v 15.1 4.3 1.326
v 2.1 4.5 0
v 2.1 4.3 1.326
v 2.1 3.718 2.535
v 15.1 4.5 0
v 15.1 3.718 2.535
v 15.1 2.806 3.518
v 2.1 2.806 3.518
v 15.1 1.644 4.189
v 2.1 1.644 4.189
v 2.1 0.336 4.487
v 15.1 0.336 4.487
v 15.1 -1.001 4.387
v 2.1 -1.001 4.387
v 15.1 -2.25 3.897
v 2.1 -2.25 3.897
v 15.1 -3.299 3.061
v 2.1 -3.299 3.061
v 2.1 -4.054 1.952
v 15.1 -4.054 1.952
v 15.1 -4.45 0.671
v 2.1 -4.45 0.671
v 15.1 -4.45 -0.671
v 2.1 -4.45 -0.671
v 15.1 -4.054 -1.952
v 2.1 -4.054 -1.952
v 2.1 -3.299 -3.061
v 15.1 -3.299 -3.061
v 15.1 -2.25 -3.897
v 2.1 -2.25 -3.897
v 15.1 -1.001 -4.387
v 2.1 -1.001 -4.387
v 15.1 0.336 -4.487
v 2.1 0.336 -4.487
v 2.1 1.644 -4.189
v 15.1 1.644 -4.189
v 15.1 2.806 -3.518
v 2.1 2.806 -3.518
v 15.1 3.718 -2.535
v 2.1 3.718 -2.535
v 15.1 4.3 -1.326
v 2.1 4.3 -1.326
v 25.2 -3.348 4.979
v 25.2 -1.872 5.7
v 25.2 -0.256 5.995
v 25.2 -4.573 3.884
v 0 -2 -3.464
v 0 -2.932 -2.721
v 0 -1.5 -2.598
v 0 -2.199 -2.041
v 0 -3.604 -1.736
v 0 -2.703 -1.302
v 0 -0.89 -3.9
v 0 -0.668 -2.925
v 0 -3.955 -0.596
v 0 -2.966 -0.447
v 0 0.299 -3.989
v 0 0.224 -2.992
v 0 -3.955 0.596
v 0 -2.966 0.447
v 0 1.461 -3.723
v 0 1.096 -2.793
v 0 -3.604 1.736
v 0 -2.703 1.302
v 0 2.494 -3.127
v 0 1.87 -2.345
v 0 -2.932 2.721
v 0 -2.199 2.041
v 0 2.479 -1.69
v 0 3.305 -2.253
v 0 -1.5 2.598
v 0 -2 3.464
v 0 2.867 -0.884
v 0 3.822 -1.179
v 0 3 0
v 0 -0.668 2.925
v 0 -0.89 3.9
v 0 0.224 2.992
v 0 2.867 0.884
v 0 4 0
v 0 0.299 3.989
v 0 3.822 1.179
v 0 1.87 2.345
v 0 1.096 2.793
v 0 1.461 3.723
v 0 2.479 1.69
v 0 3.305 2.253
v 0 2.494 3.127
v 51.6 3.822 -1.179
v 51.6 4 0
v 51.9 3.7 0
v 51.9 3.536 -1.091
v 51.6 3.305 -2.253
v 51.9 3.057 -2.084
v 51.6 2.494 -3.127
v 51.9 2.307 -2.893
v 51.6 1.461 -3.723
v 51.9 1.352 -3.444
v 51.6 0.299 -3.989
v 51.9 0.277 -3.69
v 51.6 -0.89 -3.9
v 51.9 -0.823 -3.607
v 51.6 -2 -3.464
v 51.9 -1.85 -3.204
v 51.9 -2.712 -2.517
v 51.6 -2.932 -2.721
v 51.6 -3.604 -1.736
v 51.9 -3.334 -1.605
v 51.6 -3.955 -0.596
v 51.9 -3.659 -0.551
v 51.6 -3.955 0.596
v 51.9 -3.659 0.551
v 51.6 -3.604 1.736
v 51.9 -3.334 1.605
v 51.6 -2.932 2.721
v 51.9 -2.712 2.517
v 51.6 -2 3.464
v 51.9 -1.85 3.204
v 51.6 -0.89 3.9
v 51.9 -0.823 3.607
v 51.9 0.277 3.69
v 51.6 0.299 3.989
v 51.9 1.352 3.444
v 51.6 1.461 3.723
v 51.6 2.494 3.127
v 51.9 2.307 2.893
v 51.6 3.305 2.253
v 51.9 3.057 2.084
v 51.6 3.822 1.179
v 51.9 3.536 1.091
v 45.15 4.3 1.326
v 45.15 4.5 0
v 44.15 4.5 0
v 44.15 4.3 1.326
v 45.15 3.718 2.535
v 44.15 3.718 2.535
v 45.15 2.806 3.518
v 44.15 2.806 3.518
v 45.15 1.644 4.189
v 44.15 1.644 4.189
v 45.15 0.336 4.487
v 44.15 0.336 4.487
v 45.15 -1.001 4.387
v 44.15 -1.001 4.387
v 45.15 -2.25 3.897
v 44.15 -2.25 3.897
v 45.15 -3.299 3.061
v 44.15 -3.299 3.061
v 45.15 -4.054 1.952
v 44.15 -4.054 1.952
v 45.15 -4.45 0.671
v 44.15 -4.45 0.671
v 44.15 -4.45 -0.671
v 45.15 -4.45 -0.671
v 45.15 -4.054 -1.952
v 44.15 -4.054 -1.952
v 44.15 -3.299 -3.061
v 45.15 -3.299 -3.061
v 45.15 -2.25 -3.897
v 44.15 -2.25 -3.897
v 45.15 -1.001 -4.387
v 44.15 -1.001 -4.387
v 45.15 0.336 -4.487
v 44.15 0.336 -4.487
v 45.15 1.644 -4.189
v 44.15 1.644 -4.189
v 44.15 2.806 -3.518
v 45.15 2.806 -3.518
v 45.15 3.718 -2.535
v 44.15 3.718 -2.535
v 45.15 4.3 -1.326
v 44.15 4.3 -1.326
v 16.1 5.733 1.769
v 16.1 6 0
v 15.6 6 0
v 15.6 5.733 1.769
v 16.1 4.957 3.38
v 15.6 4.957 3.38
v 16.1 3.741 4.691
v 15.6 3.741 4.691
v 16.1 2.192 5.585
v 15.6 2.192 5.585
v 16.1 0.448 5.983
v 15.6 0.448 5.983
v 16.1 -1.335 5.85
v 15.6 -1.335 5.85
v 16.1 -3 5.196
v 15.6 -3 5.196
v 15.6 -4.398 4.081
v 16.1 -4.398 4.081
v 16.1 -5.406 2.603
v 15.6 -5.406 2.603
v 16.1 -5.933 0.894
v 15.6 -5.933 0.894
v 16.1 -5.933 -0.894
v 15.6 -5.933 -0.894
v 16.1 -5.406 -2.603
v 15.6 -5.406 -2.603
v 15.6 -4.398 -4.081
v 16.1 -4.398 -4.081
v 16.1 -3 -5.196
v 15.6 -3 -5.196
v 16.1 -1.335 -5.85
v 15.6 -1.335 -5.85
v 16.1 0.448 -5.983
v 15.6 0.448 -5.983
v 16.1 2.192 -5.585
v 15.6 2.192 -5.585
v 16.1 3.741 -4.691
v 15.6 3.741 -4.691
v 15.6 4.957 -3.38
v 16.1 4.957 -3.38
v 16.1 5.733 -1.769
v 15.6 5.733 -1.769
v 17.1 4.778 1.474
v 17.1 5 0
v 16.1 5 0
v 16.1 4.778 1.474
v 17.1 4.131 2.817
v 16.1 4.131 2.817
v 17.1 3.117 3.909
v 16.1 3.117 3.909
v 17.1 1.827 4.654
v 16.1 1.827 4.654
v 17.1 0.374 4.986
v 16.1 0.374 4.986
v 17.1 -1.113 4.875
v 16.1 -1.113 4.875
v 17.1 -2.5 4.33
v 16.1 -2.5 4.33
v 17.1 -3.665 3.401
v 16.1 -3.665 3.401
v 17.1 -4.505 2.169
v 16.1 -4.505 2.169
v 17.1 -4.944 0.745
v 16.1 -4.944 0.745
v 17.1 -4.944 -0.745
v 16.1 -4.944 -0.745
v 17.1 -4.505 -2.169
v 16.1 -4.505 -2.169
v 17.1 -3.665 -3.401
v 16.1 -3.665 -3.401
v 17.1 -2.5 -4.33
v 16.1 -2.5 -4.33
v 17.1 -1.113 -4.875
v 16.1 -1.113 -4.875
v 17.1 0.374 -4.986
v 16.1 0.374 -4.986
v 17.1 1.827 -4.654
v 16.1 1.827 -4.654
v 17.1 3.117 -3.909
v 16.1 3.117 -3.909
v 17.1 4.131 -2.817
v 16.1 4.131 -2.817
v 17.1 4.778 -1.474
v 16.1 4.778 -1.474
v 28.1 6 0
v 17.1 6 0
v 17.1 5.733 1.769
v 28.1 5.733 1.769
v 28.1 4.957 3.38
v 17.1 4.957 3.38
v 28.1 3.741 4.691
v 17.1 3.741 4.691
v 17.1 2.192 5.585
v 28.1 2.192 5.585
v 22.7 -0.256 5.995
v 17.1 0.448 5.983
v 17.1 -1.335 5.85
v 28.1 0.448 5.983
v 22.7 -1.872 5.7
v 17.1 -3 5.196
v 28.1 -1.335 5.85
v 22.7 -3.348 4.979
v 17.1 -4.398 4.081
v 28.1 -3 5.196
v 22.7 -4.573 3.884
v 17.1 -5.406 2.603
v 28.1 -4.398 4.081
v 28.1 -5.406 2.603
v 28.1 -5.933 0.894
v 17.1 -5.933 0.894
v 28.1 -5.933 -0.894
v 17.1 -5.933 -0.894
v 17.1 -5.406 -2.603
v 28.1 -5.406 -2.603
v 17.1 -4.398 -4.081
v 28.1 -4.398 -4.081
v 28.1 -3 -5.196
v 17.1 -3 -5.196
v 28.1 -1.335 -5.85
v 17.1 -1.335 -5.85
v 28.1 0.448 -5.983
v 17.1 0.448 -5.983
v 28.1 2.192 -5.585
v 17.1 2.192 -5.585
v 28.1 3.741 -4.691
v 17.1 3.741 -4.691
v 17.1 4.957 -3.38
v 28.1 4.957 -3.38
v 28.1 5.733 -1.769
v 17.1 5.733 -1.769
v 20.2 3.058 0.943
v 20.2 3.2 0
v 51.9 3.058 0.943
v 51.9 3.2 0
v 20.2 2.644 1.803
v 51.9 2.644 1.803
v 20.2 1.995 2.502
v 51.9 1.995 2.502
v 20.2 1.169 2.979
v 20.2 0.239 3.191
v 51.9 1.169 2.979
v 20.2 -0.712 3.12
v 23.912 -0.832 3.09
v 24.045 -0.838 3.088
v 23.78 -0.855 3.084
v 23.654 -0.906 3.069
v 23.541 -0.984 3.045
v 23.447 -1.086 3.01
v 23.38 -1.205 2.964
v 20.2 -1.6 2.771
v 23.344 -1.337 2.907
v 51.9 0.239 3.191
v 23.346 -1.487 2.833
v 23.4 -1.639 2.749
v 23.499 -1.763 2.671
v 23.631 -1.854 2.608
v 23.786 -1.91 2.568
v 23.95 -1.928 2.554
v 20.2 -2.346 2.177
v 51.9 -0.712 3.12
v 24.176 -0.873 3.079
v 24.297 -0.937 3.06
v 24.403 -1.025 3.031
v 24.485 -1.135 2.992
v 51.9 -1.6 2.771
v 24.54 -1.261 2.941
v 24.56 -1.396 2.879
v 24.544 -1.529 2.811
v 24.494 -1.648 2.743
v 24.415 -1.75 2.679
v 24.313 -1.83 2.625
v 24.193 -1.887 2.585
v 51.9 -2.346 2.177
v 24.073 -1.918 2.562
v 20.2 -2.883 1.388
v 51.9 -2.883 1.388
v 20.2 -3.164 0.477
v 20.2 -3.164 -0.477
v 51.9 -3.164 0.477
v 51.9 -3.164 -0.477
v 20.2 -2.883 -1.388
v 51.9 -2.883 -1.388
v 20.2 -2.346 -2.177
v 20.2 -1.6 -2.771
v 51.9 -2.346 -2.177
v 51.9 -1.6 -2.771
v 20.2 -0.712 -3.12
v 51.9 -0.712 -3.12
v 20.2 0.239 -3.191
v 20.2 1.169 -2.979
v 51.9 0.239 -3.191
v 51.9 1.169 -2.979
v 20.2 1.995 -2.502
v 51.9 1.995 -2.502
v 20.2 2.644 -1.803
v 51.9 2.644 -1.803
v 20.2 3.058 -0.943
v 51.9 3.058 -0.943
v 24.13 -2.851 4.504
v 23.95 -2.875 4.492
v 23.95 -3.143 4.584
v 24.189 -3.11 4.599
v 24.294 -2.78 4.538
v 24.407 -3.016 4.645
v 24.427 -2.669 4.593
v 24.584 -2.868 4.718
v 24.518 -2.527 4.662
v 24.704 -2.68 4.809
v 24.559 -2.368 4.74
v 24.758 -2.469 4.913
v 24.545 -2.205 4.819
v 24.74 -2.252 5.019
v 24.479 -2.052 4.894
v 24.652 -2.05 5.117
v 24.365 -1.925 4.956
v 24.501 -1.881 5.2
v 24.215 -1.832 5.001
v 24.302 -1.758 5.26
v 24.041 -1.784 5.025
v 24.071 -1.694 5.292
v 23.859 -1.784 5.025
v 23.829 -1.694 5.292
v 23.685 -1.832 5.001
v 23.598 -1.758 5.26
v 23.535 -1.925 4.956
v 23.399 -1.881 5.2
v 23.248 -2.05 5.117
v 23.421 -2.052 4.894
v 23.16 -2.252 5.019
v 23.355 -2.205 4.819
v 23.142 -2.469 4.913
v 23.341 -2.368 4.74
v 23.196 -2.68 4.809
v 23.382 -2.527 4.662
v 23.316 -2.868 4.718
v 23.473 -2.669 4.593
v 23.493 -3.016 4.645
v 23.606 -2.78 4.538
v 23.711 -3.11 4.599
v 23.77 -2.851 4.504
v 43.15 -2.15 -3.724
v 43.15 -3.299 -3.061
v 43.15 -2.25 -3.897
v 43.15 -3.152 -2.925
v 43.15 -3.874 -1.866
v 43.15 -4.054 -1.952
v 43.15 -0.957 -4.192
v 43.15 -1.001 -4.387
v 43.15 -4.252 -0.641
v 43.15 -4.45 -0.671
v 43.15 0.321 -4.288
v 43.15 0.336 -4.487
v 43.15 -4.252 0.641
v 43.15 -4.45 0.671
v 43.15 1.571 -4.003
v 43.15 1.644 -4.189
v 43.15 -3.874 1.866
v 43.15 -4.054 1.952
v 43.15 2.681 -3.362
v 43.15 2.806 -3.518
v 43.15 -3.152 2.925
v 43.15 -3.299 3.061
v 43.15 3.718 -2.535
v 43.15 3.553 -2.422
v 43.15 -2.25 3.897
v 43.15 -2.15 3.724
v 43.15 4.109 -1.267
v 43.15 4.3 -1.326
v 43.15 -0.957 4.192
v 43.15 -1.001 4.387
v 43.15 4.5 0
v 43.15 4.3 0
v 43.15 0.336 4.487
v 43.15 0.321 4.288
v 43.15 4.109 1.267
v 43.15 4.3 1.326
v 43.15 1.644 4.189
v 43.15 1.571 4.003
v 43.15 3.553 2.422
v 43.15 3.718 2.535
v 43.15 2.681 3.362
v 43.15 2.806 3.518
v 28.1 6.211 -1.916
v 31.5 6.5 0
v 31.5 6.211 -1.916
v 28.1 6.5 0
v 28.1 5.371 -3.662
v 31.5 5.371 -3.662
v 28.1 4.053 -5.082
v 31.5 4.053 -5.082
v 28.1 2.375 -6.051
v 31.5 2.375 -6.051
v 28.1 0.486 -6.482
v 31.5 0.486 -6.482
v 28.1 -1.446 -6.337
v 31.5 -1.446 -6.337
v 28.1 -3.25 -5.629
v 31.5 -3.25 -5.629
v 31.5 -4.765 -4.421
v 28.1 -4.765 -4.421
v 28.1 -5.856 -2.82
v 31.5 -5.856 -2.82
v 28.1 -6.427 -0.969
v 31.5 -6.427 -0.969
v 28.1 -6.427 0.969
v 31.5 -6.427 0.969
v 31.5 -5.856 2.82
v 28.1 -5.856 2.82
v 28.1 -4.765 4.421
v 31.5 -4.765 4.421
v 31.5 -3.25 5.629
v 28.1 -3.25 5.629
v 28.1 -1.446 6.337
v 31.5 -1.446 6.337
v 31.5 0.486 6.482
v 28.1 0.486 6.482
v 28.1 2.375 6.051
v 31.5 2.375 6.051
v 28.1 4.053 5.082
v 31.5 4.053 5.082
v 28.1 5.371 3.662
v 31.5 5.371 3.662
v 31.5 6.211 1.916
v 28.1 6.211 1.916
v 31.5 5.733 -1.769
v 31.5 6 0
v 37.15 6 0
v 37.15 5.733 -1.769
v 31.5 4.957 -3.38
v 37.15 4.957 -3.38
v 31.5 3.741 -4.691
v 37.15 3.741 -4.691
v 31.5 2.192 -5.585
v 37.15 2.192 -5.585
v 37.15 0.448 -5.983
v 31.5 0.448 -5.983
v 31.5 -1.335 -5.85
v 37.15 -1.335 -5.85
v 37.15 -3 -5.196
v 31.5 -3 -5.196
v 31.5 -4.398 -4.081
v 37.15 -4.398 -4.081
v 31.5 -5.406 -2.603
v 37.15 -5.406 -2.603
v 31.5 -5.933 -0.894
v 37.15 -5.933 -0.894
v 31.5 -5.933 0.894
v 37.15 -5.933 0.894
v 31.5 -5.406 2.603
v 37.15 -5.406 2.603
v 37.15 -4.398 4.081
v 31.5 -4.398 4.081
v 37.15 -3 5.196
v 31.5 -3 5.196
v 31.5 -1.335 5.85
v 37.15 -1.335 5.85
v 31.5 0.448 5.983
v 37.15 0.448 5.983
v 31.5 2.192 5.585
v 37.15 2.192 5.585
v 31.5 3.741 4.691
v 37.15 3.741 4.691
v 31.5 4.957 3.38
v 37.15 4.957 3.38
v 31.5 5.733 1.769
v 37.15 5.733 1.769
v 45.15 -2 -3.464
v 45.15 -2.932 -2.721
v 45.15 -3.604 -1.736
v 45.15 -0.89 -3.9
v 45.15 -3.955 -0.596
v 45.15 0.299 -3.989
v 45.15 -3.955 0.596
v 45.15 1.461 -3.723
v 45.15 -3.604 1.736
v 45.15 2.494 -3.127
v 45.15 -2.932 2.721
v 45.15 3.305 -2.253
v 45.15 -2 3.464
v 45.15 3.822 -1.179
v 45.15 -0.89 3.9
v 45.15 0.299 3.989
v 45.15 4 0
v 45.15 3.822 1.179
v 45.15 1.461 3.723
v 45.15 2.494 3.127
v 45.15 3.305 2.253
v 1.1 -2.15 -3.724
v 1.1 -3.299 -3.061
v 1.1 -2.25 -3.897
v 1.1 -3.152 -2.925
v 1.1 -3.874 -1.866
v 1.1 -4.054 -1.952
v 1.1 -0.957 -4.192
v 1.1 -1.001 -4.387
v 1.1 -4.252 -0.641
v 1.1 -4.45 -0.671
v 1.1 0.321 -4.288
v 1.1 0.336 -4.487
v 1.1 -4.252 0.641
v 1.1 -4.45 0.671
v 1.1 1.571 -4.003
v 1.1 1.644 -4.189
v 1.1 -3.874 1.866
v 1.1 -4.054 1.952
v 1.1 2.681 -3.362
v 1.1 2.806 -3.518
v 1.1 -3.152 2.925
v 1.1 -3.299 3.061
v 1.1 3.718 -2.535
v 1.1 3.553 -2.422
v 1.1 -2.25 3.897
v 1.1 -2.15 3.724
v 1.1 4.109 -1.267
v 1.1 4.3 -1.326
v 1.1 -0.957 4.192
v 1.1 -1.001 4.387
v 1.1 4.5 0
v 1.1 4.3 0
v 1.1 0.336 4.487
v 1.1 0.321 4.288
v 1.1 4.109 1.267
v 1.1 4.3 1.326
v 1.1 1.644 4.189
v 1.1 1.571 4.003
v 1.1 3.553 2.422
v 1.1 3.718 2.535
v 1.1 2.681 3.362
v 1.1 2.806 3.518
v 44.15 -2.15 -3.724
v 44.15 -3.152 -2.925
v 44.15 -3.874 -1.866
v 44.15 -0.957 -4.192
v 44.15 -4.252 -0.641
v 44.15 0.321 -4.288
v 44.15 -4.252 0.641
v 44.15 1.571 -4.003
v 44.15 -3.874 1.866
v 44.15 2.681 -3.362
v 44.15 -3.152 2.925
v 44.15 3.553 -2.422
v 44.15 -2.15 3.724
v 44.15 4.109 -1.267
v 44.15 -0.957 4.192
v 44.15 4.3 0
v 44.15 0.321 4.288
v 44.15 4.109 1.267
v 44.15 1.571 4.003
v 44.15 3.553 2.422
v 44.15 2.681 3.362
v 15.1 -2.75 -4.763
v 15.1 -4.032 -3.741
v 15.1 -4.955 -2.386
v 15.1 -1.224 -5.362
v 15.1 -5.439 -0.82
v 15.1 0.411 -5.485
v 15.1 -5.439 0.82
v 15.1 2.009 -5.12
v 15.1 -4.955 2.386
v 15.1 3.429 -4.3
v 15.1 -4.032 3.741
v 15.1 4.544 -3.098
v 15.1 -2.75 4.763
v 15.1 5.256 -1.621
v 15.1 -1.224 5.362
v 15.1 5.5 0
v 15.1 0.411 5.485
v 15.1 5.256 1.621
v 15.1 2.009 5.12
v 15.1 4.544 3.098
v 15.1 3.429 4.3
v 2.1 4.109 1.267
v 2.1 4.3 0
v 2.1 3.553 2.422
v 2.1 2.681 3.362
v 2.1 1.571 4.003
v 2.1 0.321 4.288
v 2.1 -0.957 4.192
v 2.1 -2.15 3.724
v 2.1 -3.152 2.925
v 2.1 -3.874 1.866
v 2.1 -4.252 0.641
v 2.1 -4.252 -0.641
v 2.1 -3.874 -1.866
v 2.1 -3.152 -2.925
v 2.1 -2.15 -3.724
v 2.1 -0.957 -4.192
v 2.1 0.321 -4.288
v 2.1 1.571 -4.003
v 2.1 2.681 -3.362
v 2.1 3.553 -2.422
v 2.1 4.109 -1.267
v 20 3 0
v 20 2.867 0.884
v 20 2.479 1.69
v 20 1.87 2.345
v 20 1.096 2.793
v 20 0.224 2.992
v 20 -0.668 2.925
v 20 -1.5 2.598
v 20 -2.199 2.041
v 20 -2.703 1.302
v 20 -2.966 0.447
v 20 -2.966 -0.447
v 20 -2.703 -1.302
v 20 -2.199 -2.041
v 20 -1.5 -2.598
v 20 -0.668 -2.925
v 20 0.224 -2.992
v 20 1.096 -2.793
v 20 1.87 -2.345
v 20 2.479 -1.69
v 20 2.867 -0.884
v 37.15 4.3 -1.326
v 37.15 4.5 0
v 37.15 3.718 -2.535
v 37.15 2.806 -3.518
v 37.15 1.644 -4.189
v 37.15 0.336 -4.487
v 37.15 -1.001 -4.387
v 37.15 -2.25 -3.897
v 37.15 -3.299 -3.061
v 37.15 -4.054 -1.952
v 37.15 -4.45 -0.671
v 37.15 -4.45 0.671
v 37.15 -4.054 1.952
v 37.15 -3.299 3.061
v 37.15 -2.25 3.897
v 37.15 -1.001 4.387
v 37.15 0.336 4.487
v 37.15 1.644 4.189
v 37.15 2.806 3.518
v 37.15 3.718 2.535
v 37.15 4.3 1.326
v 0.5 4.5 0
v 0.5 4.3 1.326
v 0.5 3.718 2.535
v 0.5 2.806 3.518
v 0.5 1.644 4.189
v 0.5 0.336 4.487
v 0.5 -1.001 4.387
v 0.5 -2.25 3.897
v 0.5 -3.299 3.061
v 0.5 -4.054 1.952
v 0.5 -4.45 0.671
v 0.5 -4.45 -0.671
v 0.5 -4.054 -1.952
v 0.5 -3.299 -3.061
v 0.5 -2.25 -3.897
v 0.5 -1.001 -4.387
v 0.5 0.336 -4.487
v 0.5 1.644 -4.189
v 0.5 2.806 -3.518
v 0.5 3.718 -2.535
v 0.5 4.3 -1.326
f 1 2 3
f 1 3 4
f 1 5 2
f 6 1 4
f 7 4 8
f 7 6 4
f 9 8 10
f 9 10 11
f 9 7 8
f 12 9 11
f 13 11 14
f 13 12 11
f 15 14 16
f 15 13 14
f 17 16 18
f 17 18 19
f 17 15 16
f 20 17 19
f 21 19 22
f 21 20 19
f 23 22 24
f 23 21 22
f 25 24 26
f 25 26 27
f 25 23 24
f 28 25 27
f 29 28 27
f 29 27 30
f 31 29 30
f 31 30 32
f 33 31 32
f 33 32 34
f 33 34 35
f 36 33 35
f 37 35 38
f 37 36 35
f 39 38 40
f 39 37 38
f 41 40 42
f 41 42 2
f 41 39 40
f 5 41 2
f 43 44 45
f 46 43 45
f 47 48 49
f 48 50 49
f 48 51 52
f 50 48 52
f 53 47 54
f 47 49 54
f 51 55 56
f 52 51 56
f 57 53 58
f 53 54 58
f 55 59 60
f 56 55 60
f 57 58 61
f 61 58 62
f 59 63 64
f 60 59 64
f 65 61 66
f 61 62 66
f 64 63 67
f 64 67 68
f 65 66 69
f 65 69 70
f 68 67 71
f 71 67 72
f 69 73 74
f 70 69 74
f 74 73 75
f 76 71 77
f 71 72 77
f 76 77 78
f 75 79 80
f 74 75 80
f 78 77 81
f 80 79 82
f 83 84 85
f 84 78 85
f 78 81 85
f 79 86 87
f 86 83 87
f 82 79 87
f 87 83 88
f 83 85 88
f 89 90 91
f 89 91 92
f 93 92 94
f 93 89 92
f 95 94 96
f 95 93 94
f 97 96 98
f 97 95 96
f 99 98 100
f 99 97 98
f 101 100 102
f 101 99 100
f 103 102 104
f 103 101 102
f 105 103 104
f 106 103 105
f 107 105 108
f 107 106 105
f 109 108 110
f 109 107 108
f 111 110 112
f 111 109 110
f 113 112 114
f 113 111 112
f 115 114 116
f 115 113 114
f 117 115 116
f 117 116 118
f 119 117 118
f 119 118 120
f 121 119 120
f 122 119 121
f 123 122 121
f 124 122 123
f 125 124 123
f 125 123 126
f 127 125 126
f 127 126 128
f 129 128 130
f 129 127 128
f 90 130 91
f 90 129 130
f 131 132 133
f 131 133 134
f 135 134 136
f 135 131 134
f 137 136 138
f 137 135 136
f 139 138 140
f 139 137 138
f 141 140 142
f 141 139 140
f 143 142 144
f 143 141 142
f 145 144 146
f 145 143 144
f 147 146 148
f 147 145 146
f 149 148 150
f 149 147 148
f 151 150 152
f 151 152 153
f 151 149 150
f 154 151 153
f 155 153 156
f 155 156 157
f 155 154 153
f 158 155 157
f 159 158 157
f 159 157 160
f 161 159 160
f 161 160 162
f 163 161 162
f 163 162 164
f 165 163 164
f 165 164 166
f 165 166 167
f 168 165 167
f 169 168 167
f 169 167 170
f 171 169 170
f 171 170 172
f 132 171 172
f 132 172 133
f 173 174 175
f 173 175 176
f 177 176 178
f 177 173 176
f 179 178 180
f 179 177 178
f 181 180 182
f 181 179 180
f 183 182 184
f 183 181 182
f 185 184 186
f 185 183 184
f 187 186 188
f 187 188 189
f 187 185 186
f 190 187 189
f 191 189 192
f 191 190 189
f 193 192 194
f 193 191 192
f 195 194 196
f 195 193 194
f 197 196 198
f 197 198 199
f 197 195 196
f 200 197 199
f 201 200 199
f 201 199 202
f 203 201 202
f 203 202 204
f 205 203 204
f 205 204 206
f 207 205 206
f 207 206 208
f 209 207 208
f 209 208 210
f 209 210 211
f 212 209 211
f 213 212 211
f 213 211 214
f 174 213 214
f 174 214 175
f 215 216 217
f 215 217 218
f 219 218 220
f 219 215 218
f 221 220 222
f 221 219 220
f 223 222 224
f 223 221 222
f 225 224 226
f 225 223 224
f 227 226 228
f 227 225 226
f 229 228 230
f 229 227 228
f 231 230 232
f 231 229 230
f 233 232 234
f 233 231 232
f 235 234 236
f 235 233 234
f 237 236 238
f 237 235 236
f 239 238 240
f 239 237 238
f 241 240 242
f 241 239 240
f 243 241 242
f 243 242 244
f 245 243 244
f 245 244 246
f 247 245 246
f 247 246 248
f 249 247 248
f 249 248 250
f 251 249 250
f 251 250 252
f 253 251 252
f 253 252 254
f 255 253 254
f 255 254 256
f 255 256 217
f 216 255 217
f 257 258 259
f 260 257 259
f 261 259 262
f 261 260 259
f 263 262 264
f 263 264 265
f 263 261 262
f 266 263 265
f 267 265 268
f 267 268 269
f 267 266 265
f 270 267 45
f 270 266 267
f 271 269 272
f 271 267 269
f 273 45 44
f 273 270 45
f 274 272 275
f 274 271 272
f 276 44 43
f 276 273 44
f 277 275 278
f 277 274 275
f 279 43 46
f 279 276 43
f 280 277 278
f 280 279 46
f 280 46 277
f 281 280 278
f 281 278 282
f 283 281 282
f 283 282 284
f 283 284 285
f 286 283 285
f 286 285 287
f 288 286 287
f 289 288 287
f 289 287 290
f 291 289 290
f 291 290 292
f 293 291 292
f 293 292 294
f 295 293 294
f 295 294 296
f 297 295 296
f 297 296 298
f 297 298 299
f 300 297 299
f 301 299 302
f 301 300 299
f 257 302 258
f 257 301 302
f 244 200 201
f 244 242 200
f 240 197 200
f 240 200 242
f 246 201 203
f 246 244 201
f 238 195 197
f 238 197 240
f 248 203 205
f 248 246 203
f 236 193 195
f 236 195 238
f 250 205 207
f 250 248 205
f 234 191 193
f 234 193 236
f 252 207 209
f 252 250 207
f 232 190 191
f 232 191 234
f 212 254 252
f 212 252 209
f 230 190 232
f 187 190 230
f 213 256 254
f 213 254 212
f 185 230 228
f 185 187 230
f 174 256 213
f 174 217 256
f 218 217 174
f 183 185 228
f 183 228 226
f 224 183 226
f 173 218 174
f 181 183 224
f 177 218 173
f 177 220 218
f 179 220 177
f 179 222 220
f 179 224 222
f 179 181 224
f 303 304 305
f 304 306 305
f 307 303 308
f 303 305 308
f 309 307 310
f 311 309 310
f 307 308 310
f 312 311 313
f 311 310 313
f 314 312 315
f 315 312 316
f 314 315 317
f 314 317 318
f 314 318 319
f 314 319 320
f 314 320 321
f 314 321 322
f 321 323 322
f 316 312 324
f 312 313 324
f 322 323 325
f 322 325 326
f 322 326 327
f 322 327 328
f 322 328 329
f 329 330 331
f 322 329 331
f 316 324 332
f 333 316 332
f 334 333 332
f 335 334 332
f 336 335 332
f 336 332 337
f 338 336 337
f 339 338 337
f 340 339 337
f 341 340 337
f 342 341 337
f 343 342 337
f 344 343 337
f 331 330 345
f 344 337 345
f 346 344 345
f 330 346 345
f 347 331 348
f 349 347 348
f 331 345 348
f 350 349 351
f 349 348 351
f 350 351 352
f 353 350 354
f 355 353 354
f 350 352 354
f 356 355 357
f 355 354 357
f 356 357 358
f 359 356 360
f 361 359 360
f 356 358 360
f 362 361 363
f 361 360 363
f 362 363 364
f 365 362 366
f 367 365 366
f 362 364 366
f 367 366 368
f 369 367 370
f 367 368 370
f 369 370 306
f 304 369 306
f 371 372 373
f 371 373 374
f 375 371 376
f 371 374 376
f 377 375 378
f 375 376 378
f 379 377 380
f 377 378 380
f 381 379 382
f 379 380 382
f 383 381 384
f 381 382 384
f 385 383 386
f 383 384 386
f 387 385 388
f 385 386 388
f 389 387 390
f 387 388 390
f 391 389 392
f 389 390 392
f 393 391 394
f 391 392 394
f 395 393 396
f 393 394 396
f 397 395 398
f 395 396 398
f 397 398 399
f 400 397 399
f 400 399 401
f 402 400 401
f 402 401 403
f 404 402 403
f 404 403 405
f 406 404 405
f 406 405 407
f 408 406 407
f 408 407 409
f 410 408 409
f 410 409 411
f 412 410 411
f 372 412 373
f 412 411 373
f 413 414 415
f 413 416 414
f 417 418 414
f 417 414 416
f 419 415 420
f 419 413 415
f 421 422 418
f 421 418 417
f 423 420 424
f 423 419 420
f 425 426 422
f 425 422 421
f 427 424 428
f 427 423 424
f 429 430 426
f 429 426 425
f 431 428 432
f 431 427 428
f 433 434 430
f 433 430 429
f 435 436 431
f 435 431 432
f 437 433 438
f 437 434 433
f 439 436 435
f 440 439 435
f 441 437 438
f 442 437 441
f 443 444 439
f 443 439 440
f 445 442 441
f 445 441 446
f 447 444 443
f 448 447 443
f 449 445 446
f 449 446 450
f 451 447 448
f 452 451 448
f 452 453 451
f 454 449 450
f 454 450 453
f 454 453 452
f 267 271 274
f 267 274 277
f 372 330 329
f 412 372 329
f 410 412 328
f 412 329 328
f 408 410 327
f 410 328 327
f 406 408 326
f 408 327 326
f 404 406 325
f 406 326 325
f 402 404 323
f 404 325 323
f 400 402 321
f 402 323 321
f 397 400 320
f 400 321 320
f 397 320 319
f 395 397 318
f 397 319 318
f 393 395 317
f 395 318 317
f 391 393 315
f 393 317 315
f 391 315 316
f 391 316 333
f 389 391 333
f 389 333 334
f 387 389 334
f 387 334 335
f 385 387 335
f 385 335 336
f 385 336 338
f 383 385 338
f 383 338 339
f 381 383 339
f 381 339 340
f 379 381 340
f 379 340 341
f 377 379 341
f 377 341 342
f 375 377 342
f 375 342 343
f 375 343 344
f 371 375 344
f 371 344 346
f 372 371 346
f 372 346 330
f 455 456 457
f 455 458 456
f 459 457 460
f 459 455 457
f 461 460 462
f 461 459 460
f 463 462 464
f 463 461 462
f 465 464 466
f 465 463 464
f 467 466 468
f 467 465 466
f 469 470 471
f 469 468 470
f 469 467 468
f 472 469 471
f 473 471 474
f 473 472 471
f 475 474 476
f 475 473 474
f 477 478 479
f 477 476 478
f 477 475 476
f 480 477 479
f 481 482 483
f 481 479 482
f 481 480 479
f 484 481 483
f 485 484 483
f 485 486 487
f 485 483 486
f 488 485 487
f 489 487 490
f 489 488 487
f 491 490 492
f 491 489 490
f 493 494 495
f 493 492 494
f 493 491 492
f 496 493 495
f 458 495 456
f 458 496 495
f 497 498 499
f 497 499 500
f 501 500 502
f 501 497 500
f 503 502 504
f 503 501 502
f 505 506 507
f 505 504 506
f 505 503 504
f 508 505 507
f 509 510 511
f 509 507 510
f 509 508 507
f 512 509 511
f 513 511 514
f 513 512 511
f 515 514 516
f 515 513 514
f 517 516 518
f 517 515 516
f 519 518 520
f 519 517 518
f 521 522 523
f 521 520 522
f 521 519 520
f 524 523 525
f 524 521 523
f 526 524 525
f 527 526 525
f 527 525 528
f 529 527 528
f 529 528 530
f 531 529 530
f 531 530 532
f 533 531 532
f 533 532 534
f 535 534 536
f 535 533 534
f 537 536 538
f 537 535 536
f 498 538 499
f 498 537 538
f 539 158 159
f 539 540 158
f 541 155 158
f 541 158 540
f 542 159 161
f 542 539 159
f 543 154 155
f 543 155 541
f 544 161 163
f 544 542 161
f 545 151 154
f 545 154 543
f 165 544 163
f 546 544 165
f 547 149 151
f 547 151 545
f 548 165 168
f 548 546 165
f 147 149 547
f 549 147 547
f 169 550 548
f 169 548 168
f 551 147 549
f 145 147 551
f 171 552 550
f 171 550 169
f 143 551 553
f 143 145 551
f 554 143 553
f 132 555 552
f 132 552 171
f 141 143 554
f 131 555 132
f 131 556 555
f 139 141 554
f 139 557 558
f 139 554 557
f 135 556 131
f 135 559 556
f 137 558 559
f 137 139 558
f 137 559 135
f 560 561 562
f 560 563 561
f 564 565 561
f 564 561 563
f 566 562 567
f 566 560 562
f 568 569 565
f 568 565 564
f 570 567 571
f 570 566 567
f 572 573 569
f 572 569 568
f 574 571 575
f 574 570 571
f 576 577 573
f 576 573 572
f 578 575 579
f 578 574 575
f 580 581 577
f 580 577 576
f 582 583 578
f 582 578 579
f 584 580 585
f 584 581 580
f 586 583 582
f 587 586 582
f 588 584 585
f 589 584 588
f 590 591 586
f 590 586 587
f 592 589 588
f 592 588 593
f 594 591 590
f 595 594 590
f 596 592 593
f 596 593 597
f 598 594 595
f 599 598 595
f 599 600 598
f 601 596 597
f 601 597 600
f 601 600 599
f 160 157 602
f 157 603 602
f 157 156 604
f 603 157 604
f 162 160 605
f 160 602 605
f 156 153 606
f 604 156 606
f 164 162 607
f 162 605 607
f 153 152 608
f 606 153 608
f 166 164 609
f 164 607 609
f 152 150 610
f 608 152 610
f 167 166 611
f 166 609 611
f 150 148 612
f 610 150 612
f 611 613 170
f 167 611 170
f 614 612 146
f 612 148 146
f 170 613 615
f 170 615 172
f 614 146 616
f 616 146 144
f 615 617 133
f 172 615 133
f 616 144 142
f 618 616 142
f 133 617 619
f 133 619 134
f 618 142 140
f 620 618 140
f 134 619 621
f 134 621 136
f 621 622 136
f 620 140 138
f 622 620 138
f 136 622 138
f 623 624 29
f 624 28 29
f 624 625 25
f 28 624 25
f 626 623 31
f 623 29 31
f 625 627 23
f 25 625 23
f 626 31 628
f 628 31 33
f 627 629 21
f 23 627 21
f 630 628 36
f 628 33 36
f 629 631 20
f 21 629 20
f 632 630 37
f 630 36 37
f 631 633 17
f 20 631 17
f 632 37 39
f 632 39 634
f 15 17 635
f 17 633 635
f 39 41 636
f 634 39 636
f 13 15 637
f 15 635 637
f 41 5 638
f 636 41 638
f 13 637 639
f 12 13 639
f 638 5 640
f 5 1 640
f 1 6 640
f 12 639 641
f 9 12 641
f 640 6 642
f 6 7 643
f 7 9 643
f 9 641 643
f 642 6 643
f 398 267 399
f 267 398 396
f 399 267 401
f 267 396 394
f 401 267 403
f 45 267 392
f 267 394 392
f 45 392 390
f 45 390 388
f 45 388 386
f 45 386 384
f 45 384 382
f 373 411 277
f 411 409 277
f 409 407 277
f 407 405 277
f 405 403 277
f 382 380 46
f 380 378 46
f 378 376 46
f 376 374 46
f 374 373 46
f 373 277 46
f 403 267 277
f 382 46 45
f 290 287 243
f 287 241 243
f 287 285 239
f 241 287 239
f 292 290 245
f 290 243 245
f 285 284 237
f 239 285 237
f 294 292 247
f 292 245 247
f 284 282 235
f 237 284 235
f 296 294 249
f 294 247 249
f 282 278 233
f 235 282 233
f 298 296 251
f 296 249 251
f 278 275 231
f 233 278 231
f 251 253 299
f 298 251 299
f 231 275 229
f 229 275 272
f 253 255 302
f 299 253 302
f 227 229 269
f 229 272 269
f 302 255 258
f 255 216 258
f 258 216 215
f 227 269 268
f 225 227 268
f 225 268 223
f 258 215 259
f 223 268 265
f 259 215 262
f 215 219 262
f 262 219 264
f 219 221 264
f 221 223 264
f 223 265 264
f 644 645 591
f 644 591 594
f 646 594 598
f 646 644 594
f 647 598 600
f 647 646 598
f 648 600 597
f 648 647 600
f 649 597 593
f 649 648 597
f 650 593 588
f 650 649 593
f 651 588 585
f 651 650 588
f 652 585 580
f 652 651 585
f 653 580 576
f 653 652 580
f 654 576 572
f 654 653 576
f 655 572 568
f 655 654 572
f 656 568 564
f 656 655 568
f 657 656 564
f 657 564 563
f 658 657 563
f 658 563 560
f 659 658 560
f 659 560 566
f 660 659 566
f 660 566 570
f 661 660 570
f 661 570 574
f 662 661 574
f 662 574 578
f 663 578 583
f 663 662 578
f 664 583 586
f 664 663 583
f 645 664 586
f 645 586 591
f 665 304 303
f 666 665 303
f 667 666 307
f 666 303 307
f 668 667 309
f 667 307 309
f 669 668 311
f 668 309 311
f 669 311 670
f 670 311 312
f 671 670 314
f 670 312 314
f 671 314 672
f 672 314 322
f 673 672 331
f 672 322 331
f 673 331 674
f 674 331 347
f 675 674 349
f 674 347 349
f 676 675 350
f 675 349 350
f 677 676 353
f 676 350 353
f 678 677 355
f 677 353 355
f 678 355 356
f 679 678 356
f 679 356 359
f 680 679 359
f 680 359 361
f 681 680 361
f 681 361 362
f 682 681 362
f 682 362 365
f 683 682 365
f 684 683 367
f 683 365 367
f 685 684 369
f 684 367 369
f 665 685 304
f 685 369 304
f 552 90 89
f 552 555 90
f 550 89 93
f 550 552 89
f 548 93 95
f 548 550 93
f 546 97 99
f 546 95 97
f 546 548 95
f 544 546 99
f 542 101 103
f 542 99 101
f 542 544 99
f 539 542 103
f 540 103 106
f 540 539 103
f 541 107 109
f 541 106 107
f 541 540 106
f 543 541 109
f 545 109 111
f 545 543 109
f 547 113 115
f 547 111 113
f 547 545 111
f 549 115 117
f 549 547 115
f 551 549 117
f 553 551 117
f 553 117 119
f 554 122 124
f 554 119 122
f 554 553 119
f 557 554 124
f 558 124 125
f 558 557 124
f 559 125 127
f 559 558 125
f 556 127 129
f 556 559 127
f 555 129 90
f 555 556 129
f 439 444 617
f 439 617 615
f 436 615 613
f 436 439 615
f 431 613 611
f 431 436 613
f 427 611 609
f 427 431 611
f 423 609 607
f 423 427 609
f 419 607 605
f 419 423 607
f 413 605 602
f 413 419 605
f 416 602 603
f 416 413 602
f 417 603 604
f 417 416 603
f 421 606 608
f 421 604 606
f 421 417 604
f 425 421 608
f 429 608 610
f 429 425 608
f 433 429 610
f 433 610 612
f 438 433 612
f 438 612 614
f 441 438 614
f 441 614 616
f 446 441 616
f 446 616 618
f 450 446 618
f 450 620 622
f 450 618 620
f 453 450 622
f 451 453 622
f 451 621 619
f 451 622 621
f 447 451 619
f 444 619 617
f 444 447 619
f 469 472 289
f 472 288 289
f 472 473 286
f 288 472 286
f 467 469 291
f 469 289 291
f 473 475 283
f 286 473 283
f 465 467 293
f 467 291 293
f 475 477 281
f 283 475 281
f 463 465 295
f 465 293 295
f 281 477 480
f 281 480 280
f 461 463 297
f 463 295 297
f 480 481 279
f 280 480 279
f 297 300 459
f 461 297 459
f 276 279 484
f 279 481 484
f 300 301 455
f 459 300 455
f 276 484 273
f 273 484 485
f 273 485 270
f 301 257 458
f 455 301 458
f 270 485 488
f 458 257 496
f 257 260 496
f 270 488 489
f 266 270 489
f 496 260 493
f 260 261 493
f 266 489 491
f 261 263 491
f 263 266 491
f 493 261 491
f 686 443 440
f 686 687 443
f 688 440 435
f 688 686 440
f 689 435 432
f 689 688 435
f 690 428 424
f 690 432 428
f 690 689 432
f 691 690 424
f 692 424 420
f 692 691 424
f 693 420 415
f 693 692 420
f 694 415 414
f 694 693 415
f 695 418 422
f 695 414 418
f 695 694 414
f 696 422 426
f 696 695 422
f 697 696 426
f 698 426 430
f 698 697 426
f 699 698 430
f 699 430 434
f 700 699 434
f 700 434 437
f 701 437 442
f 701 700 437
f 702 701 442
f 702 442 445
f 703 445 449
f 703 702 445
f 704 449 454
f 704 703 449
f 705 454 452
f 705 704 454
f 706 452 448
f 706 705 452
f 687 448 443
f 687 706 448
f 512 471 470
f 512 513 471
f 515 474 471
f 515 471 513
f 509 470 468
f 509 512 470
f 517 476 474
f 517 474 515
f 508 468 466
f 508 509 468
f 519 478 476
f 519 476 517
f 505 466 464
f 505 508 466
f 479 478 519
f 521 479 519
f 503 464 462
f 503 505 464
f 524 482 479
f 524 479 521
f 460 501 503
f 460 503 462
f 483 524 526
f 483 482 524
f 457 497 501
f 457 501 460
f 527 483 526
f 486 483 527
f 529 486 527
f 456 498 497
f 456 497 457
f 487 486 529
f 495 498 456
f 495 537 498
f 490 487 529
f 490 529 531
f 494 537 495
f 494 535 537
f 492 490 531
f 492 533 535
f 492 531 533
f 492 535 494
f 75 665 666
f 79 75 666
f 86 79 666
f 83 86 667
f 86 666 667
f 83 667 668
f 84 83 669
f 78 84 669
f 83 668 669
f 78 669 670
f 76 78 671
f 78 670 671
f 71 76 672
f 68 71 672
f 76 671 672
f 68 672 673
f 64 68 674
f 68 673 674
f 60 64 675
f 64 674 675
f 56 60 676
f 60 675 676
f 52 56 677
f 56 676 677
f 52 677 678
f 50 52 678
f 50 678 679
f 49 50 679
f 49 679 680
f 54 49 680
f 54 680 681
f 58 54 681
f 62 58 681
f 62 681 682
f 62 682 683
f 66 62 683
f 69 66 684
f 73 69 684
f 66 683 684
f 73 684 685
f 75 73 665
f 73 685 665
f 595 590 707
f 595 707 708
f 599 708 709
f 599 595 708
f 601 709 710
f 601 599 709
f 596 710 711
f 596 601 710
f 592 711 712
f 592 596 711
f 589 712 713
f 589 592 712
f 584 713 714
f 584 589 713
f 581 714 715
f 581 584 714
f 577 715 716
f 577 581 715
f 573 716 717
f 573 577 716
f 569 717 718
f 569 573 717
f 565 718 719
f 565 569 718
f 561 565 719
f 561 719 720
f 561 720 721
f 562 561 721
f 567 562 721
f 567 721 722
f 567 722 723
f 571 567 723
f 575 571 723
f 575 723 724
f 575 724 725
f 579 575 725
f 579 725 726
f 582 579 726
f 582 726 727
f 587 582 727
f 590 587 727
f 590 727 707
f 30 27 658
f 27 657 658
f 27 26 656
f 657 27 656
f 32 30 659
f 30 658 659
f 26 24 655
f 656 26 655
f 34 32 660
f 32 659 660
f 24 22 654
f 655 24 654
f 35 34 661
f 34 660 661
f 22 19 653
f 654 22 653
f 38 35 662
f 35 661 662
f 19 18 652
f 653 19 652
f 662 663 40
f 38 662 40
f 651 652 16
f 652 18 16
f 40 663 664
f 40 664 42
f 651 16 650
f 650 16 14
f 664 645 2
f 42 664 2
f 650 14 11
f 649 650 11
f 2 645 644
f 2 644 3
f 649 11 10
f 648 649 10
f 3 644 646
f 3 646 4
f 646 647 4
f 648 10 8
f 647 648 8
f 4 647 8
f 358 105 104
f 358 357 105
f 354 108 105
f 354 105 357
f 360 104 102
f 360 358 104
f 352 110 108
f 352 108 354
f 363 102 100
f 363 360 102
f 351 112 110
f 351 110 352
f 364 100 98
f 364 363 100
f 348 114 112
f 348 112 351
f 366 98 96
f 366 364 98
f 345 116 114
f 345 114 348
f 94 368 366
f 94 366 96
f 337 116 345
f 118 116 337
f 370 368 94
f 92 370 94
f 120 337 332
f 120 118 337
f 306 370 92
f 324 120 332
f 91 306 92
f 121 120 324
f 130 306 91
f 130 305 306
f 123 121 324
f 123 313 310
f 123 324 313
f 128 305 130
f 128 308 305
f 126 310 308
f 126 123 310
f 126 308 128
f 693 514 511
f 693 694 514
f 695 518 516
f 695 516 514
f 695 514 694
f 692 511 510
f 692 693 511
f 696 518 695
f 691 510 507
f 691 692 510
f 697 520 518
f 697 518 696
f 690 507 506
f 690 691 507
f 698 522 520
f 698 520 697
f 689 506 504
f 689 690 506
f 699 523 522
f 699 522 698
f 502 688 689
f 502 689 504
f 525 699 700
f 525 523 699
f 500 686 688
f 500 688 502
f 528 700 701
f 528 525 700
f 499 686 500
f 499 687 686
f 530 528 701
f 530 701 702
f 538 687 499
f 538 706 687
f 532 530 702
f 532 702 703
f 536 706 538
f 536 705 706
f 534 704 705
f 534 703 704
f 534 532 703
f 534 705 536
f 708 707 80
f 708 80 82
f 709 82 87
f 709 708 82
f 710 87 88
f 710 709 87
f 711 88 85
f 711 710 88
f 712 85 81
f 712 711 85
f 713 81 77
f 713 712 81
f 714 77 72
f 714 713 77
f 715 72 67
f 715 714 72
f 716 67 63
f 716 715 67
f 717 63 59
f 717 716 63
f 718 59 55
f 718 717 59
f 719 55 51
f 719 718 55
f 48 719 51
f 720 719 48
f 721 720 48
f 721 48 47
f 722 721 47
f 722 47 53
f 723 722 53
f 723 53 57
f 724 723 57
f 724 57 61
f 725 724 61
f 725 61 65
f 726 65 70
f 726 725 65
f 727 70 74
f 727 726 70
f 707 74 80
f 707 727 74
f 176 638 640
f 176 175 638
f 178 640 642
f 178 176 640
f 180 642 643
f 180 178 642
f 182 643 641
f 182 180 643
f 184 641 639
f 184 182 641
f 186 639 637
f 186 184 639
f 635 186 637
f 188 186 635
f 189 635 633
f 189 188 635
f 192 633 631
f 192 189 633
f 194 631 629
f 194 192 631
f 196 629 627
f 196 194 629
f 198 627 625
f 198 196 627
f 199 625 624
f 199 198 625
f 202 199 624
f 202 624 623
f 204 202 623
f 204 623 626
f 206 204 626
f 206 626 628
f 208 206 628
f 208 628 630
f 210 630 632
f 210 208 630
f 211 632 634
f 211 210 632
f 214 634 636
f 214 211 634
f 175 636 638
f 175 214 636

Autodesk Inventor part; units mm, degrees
ref_plane "YZ Plane" through (0, 0, 0) normal (1, 0, 0) x (0, 1, 0)
ref_plane "XZ Plane" through (0, 0, 0) normal (0, 1, 0) x (-1, 0, 0)
ref_plane "XY Plane" through (0, 0, 0) normal (0, 0, 1) x (1, 0, 0)
sketch "Sketch2" plane through (0, 0, 0) normal (0, 0, 1) x (1, 0, 0)
  line L0 (0, 4) -> (0.5, 4.5)
  line L1 (0, 4) -> (0, 3)
  line L2 (0.5, 4.5) -> (1.1, 4.5)
  line L3 (1.1, 4.5) -> (1.1, 4.3)
  line L4 (1.1, 4.3) -> (2.1, 4.3)
  line L5 (2.1, 4.3) -> (2.1, 4.5)
  line L6 (2.1, 4.5) -> (15.1, 4.5)
  line L7 (15.1, 4.5) -> (15.1, 5.5)
  line L8 (15.1, 5.5) -> (15.6, 6)
  line L9 (0, 3) -> (20, 3)
  line L10 (20, 3) -> (20.2, 3.2)
  line L11 (44.15, 4.5) -> (44.15, 4.3)
  line L12 (44.15, 4.3) -> (43.15, 4.3)
  line L13 (43.15, 4.3) -> (43.15, 4.5)
  line L14 (0, 0) -> (27.0854, 0) construction
  line L15 (15.6, 6) -> (16.1, 6)
  line L16 (16.1, 6) -> (16.1, 5)
  line L17 (16.1, 5) -> (17.1, 5)
  line L18 (17.1, 5) -> (17.1, 6)
  line L19 (31.9, 6) -> (31.5, 6)
  line L20 (31.5, 6) -> (31.5, 6.5)
  line L21 (31.5, 6.5) -> (28.1, 6.5)
  line L22 (28.1, 6.5) -> (28.1, 6)
  line L23 (17.1, 6) -> (28.1, 6)
  line L24 (20.2, 3.2) -> (43.9, 3.2)
  line L25 (44.15, 4.5) -> (45.15, 4.5)
  line L26 (43.15, 4.5) -> (37.9, 4.5)
  line L27 (37.15, 6) -> (31.9, 6)
  line L28 (43.9, 3.2) -> (49.9, 3.2)
  line L29 (49.9, 4) -> (45.15, 4)
  line L30 (45.15, 4) -> (45.15, 4.5)
  line L31 (49.9, 3.2) -> (51.9, 3.2)
  line L32 (51.9, 3.2) -> (51.9, 4)
  line L33 (51.9, 4) -> (49.9, 4)
  line L34 (37.9, 4.5) -> (37.15, 4.5)
  line L35 (37.15, 4.5) -> (37.15, 6)
  point P0 (1.1, 4.4)
  point P1 (15.85, 6)
  point P2 (16.6, 5)
  dimension "d3" = 4
  dimension "d8" = 1
  dimension "d9" = 0.5
  dimension "d10" = 0.5
  dimension "d11" = 0.2
  dimension "d12" = 1
  dimension "d13" = 13
  dimension "d14" = 1
  dimension "d15" = 20
  dimension "d26" = 0.2
  dimension "d27" = 0.2
  dimension "d29" = 0.5
  dimension "d30" = 0.5
  dimension "d36" = 1.1
  dimension "d37" = 4.5
  dimension "d38" = 3
  dimension "d39" = 0.5
  dimension "d40" = 1
  dimension "d41" = 1
  dimension "d60" = 0.4
  dimension "d61" = 0.5
  dimension "d62" = 3.4
  dimension "d63" = 11
  dimension "d65" = 1
  dimension "d66" = 5.25
  dimension "d83" = 6
  dimension "d84" = 0.8
  dimension "d85" = 2
  dimension "d86" = 0.75
revolve "Revolution1" add sketch "Sketch2" angle 360 about axis through (0, 0, 0) along (1, 0, 0)
thread "Thread1" size "M6x1" class "6H" standard "ISO Metric profile" full length
ref_plane "Work Plane1" through (51.1424, -20, -139.2633) normal (0, 1, 0) x (-1, 0, 0)
sketch "Sketch4" plane through (17.1, 0, 0) normal (-1, 0, 0) x (0, 0, 1)
  circle A0 centre (0, 0) radius 6 projected
  point P0 (0, 6)
  point P1 (6, 0)
  point P2 (0, -6.0107)
  point P3 (-6.0435, 0)
ref_plane "Work Plane2" through (22.6, -2.6349, 5.3905) normal (0, 0.4392, -0.8984) x (1, 0, 0)
ref_plane "Work Plane3" through (25.4, -2.6349, 5.3905) normal (0, 0.4392, -0.8984) x (1, 0, 0)
sketch "Sketch7" plane through (22.6, -2.6349, 5.3905) normal (0, 0.4392, -0.8984) x (1, 0, 0)
  line L0 (2.6, 5) -> (0.1, 5)
  line L1 (0.1, 5) -> (0.1, -5)
  line L2 (0.1, -5) -> (2.6, -5)
  line L3 (2.6, -5) -> (2.6, 5)
  line L4 (2.6, 5) -> (0.1, -5) construction
  line L5 (0.1, 5) -> (2.6, -5) construction
  line L6 (-22.6, -4) -> (-22.6, 4) construction
  point P0 (-22.6, 0)
  point P1 (1.35, 0)
  dimension "d68" = 2.5
  dimension "d69" = 10
  dimension "d70" = 23.95
extrude "Extrusion3" cut sketch "Sketch7" along normal blind 0.5
hole "Hole2" at (23.95, -2.6349, 5.3905) direction (0, 0.4392, -0.8984) diameter 1.221 depth 5.3 tip angle 118 thread size "M1.6x0.35" class "6H" standard "ISO Metric profile"
chamfer "Chamfer2" distance 0.2 angle 45 1 edges at (23.95, -1.8669, 5.2094)
chamfer "Chamfer3" distance 0.3 angle 45 1 edges at (51.9, -4, 0)
properties part number "nakrętka"
